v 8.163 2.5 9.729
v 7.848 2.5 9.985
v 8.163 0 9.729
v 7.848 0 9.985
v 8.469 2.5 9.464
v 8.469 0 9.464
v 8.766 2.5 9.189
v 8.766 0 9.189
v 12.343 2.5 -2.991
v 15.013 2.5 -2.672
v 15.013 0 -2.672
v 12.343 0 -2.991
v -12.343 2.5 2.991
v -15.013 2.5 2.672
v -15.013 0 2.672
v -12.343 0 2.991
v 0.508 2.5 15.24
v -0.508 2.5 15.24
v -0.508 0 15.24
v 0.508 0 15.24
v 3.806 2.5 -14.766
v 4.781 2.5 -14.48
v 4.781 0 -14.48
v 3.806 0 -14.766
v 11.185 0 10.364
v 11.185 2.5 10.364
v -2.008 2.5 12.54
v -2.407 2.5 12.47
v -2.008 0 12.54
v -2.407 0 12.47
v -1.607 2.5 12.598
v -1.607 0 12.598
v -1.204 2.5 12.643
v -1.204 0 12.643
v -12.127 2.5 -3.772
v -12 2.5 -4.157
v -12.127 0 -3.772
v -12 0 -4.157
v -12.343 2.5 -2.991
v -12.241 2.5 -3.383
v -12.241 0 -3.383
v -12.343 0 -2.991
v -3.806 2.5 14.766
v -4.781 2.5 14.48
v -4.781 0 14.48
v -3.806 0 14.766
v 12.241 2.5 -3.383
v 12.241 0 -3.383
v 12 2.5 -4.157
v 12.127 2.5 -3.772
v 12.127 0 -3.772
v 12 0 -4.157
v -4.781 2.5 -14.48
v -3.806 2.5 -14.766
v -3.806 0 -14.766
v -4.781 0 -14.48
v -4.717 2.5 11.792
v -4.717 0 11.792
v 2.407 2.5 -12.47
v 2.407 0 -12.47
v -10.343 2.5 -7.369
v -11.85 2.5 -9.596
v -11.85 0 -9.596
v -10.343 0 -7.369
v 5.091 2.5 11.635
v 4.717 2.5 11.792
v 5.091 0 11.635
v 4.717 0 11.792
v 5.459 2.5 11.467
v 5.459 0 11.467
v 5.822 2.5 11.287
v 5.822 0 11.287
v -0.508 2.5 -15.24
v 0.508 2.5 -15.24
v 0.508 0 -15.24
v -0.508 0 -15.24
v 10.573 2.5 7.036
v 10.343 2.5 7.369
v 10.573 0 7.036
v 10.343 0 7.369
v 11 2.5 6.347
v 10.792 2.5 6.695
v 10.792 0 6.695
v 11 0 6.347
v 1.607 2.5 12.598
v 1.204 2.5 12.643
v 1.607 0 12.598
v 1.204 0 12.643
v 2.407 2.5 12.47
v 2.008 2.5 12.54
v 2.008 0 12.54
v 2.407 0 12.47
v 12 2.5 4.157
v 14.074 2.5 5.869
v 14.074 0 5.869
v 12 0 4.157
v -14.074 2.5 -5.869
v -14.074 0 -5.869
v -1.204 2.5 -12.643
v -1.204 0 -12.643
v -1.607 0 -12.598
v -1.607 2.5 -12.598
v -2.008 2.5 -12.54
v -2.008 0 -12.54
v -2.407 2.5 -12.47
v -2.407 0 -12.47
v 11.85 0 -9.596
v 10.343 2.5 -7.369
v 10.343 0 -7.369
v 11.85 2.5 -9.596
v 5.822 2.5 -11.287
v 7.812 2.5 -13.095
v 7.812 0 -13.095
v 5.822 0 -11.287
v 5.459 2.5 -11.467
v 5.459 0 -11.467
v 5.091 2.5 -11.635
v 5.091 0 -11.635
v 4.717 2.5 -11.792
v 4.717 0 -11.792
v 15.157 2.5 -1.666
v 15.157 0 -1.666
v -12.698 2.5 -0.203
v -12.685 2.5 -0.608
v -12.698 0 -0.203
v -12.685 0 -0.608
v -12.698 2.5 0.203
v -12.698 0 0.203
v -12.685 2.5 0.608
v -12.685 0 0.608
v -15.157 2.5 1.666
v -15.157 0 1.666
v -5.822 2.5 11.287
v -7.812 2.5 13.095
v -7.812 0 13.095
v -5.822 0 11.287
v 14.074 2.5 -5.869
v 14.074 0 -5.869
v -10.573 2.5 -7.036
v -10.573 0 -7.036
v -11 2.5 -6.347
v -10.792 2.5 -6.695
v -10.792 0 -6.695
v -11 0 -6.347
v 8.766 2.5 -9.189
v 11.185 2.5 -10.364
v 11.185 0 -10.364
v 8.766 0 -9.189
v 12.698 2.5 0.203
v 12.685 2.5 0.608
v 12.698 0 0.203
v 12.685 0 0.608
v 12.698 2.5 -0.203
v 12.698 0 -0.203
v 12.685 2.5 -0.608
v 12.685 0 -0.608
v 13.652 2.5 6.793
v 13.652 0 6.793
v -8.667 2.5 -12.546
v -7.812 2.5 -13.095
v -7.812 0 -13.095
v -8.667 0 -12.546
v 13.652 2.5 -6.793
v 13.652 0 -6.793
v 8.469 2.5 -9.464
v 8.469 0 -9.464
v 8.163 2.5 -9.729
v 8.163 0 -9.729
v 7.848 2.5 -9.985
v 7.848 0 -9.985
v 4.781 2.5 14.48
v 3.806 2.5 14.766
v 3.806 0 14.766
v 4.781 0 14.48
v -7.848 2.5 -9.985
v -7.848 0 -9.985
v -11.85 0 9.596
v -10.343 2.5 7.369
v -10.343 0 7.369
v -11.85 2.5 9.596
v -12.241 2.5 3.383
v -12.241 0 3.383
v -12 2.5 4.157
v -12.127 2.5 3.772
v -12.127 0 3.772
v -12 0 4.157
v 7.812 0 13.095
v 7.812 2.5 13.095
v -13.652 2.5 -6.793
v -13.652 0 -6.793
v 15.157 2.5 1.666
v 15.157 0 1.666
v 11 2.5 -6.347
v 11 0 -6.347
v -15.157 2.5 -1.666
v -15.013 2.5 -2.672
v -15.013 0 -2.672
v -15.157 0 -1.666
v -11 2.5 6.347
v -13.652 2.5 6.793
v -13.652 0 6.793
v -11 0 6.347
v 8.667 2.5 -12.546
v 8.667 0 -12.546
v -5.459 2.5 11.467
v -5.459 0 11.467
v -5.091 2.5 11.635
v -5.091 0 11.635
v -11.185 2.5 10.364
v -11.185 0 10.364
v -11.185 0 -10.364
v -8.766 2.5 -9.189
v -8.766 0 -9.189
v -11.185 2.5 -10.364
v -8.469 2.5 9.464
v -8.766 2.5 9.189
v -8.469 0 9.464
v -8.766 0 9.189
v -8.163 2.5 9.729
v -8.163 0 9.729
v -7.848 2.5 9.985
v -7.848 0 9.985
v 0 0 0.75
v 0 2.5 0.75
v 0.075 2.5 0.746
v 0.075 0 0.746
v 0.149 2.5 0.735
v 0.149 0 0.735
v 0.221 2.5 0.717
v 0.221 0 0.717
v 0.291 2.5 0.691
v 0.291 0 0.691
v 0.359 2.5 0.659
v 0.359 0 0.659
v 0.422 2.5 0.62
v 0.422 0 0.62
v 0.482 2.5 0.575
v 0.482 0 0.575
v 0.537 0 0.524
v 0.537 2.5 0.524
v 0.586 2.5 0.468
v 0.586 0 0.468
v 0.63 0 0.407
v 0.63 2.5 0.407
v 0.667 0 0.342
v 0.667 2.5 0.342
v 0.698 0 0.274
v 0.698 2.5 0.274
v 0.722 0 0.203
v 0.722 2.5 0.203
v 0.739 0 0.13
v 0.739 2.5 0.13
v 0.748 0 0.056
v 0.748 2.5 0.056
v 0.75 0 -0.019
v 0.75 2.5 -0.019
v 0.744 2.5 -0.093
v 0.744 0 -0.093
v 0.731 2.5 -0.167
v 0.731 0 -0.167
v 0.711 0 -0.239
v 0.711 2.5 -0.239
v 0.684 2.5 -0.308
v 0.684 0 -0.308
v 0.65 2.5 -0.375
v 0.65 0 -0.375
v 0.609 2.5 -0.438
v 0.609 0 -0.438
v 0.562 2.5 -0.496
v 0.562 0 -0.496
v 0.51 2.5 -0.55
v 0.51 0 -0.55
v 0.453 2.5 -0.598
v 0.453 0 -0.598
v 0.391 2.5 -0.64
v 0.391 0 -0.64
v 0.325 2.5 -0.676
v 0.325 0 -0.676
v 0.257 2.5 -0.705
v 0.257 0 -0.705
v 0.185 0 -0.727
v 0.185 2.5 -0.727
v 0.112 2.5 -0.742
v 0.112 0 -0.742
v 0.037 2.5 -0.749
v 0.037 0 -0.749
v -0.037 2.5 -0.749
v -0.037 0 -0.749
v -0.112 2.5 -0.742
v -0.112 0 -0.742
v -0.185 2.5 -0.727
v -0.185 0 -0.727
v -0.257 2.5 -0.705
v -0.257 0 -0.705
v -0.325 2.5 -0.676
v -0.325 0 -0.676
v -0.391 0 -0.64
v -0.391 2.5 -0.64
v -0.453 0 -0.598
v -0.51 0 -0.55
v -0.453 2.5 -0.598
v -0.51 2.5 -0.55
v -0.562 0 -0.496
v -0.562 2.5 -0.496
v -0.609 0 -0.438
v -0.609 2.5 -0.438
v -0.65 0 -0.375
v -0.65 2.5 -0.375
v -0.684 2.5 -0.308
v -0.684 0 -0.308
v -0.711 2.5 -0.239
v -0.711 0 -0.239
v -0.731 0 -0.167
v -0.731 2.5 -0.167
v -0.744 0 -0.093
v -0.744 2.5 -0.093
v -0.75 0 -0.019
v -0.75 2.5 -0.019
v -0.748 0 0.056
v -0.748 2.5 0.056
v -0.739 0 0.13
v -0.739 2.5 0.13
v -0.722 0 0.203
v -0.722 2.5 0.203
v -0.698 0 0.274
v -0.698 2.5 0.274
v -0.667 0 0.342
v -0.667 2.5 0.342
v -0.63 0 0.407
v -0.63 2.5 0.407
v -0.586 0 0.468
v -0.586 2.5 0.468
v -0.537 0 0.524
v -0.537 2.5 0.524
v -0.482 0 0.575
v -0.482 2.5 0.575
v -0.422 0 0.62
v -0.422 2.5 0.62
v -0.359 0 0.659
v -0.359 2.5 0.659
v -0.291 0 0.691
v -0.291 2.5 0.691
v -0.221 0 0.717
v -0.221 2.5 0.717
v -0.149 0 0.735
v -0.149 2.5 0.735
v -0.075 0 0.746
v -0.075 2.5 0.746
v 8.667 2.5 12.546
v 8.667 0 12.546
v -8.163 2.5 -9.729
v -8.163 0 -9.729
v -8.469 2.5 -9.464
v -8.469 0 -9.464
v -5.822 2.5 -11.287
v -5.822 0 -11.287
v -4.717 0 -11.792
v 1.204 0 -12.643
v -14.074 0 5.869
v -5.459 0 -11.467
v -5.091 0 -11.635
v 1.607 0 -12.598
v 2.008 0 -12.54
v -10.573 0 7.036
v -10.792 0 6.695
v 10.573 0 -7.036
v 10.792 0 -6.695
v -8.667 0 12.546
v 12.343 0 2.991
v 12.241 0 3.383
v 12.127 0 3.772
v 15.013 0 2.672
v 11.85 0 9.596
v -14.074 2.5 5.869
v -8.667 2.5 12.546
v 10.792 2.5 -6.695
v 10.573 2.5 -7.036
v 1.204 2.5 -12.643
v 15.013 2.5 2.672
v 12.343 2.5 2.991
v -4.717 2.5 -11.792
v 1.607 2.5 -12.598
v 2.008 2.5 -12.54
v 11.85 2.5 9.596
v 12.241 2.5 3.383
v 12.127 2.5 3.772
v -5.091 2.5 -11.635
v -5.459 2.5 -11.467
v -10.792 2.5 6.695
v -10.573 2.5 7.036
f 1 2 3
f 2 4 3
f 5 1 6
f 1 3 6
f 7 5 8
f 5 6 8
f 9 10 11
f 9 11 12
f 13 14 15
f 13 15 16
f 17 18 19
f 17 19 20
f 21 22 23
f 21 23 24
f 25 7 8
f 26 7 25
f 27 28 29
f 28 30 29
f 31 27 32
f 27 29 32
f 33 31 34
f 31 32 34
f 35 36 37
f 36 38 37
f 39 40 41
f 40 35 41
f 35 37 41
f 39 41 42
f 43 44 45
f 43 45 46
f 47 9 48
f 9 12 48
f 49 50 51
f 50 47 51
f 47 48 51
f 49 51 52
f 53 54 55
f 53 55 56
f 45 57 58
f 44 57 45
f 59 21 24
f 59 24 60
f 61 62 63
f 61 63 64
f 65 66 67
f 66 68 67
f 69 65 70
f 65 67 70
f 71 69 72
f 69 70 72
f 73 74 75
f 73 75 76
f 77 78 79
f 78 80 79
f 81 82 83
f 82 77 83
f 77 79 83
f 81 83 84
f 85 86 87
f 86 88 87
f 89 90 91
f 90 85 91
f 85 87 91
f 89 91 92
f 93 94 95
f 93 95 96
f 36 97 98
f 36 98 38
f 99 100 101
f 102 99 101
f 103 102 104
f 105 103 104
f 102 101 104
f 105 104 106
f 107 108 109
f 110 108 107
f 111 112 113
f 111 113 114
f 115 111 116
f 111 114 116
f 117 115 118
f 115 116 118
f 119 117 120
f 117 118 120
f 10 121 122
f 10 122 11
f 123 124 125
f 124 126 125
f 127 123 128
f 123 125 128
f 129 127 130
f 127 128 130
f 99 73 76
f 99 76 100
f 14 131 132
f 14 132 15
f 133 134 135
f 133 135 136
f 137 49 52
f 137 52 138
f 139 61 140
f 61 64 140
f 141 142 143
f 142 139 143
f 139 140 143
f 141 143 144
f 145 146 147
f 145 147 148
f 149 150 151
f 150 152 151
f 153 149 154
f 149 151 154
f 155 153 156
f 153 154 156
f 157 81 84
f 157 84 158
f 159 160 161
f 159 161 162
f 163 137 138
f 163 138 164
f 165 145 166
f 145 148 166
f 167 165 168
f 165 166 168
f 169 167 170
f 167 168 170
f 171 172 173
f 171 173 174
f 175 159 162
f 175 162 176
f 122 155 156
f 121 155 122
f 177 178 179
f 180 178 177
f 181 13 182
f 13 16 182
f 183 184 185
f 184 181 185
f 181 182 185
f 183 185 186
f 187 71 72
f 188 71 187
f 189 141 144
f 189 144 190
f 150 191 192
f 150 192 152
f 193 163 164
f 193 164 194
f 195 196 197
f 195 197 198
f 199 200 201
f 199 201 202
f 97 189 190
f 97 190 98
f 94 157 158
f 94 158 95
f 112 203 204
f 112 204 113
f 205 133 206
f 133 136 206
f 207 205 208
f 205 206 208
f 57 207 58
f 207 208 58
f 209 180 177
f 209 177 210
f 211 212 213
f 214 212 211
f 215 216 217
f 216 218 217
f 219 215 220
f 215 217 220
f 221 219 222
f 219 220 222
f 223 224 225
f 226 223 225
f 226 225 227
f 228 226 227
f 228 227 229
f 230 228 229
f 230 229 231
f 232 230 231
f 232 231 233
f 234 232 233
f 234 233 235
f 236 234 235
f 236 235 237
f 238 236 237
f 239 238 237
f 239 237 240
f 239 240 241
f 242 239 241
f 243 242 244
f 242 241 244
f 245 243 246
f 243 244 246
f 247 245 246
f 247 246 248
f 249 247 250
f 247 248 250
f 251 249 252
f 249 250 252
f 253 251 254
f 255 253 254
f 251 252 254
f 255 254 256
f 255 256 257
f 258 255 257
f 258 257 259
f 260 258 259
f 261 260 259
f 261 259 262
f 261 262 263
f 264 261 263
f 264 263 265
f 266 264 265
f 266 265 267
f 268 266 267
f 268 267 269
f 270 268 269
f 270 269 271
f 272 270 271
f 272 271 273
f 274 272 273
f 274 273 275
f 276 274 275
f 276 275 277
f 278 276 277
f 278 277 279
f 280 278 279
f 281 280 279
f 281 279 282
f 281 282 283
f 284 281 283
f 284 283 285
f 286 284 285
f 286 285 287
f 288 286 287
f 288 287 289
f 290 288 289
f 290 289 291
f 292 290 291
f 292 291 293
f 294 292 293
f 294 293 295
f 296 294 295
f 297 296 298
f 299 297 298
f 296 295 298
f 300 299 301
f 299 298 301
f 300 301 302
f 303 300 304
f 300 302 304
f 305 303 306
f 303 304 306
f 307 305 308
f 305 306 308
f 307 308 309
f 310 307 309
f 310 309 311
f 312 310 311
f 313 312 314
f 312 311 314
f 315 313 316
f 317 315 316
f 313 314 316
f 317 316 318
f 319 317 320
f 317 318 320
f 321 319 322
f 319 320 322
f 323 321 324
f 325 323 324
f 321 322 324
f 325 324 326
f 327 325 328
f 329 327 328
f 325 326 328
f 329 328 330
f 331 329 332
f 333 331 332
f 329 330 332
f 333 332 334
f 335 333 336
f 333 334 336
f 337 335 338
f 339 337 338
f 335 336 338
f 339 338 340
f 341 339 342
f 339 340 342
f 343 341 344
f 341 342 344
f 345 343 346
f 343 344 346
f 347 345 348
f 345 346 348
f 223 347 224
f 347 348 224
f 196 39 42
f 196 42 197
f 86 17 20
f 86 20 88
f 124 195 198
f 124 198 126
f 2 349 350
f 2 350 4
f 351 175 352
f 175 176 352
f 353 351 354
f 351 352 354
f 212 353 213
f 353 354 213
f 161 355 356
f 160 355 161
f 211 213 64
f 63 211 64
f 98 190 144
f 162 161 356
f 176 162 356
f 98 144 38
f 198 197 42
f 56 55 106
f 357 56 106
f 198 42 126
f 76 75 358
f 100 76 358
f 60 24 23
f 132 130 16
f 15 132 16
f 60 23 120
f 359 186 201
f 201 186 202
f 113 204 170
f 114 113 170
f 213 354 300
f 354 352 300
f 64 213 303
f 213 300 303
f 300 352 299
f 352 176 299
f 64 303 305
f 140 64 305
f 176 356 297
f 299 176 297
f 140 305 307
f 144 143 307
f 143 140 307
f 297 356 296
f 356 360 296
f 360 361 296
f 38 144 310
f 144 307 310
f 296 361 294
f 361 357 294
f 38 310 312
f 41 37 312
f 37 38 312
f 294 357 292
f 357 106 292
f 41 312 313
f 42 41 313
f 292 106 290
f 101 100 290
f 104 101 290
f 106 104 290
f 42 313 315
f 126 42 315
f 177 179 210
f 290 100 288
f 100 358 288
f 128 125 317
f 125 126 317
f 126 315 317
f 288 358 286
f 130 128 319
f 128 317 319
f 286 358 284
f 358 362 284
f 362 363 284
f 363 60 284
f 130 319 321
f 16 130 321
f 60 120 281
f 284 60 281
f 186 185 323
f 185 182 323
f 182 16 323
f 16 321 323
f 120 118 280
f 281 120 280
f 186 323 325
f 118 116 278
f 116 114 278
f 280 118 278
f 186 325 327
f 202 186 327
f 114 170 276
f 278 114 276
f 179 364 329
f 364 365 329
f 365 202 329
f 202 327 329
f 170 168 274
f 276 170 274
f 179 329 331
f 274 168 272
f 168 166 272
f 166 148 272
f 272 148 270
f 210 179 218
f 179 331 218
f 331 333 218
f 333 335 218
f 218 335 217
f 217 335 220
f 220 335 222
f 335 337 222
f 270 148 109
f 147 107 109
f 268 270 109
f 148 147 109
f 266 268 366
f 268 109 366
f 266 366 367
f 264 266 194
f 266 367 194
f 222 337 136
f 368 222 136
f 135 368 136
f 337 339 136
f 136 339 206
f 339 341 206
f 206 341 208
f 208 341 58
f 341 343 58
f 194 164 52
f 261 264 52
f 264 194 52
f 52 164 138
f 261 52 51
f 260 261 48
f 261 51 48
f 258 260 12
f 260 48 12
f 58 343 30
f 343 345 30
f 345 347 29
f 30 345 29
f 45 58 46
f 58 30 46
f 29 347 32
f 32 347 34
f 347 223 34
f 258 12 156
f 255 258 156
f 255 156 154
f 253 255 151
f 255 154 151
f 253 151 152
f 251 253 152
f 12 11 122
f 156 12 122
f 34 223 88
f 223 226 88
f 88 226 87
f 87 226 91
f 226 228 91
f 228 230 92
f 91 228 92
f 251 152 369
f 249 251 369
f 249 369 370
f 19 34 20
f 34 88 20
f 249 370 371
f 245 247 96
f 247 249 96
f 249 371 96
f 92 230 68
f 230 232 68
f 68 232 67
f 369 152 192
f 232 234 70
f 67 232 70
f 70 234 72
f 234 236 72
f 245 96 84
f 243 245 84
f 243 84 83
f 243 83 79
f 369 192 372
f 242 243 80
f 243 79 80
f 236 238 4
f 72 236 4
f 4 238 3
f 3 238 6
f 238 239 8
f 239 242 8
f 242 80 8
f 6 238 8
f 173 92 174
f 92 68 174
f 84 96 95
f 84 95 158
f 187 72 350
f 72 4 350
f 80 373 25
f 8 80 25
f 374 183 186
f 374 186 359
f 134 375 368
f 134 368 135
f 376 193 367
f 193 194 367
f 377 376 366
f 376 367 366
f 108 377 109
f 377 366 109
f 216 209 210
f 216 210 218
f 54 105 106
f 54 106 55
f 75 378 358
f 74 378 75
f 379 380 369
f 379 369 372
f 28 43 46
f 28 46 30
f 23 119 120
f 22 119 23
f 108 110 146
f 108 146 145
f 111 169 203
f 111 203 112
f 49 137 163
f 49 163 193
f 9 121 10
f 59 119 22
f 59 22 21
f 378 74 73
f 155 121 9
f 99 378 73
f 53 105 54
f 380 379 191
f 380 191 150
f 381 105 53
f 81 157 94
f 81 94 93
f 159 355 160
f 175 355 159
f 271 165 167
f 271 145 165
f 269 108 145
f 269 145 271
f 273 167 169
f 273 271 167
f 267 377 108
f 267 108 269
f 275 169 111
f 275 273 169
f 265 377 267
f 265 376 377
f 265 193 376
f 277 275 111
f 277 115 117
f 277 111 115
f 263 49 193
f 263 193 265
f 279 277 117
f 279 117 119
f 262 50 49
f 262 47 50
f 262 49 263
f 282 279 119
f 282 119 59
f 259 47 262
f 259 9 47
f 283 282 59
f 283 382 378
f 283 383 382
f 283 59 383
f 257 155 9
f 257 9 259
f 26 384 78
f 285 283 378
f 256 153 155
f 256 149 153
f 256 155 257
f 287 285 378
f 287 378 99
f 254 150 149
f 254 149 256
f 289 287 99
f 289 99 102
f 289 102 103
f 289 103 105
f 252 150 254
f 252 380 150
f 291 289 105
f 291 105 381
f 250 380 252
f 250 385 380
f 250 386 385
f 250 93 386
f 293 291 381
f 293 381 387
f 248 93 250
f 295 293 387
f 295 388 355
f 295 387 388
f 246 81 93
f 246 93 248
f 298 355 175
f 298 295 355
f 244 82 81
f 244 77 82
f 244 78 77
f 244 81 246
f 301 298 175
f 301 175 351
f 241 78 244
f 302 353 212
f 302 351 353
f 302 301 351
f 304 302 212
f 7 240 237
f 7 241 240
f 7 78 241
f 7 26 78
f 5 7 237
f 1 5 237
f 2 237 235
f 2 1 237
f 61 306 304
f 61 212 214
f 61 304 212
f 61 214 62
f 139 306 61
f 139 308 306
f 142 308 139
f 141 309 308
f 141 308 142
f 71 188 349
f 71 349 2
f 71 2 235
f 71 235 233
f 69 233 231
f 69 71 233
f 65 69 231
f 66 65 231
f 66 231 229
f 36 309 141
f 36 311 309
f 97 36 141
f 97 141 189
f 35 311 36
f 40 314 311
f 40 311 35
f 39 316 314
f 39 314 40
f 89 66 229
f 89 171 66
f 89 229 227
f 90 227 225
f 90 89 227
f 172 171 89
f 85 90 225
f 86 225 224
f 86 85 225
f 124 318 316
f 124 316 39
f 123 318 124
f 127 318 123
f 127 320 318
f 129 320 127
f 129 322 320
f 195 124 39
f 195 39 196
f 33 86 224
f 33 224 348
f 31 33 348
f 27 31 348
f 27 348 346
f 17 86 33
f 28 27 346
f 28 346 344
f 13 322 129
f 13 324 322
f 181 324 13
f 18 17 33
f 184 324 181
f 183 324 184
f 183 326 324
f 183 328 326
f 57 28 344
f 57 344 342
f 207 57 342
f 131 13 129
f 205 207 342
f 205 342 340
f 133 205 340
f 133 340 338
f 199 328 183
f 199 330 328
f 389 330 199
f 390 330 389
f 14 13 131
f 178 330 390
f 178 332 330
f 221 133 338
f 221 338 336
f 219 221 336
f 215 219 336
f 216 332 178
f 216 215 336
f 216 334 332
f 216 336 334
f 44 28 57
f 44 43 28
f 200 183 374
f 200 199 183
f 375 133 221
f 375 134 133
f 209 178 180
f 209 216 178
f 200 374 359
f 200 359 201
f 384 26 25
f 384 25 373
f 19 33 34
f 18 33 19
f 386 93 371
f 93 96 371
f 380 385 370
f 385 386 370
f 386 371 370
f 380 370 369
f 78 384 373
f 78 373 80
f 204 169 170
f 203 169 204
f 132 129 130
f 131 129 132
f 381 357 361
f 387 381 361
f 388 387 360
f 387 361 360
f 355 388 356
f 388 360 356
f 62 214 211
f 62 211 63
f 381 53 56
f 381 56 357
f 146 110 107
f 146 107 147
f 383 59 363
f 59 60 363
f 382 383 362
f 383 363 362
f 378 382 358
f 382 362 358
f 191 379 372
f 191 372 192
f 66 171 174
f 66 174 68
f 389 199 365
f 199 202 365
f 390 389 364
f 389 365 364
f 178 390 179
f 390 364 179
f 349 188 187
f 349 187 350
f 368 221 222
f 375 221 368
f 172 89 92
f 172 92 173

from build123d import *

# Parameters (mm, degrees)
SKETCH1_R           = 12.7
BOSS_EXTRUDE1_DEPTH = 2.5
BOSS_EXTRUDE2_DEPTH = 2.5
CIRPATTERN1_COUNT   = 22
SKETCH3_R           = 0.75
CUT_EXTRUDE1_DEPTH  = 5


with BuildPart() as part:
    # Sketch1 → Boss-Extrude1 (new body)
    with BuildSketch(Plane(origin=(0, 0, 0), x_dir=(1, 0, 0), z_dir=(0, 1, 0))):
        with Locations(Location((0, 0, 0), (0, 0, 270))):
            Circle(SKETCH1_R)
    extrude(amount=BOSS_EXTRUDE1_DEPTH)

    # Sketch2 → Boss-Extrude2 (add)
    with BuildSketch(Plane(origin=(0, 2.5, 0), x_dir=(1, 0, 0), z_dir=(0, 1, 0))):
        Polygon((-1.324709139, 12.192), (1.324709139, 12.192), (0.508, 15.24), (-0.508, 15.24), align=None)
    boss_extrude2 = extrude(amount=-BOSS_EXTRUDE2_DEPTH)

    # CirPattern1: Boss-Extrude2 ×22 about axis
    cirpattern1_axis = Axis((0, 0, 0), (0, 1, 0))
    for i in range(1, CIRPATTERN1_COUNT):
        add(boss_extrude2.rotate(cirpattern1_axis, i * 360 / CIRPATTERN1_COUNT))

    # Sketch3 → Cut-Extrude1 (cut)
    with BuildSketch(Plane(origin=(0, 2.5, 0), x_dir=(1, 0, 0), z_dir=(0, 1, 0))):
        with Locations(Location((0, 0, 0), (0, 0, 270))):
            Circle(SKETCH3_R)
    extrude(amount=-CUT_EXTRUDE1_DEPTH, mode=Mode.SUBTRACT)


solid = part.part
